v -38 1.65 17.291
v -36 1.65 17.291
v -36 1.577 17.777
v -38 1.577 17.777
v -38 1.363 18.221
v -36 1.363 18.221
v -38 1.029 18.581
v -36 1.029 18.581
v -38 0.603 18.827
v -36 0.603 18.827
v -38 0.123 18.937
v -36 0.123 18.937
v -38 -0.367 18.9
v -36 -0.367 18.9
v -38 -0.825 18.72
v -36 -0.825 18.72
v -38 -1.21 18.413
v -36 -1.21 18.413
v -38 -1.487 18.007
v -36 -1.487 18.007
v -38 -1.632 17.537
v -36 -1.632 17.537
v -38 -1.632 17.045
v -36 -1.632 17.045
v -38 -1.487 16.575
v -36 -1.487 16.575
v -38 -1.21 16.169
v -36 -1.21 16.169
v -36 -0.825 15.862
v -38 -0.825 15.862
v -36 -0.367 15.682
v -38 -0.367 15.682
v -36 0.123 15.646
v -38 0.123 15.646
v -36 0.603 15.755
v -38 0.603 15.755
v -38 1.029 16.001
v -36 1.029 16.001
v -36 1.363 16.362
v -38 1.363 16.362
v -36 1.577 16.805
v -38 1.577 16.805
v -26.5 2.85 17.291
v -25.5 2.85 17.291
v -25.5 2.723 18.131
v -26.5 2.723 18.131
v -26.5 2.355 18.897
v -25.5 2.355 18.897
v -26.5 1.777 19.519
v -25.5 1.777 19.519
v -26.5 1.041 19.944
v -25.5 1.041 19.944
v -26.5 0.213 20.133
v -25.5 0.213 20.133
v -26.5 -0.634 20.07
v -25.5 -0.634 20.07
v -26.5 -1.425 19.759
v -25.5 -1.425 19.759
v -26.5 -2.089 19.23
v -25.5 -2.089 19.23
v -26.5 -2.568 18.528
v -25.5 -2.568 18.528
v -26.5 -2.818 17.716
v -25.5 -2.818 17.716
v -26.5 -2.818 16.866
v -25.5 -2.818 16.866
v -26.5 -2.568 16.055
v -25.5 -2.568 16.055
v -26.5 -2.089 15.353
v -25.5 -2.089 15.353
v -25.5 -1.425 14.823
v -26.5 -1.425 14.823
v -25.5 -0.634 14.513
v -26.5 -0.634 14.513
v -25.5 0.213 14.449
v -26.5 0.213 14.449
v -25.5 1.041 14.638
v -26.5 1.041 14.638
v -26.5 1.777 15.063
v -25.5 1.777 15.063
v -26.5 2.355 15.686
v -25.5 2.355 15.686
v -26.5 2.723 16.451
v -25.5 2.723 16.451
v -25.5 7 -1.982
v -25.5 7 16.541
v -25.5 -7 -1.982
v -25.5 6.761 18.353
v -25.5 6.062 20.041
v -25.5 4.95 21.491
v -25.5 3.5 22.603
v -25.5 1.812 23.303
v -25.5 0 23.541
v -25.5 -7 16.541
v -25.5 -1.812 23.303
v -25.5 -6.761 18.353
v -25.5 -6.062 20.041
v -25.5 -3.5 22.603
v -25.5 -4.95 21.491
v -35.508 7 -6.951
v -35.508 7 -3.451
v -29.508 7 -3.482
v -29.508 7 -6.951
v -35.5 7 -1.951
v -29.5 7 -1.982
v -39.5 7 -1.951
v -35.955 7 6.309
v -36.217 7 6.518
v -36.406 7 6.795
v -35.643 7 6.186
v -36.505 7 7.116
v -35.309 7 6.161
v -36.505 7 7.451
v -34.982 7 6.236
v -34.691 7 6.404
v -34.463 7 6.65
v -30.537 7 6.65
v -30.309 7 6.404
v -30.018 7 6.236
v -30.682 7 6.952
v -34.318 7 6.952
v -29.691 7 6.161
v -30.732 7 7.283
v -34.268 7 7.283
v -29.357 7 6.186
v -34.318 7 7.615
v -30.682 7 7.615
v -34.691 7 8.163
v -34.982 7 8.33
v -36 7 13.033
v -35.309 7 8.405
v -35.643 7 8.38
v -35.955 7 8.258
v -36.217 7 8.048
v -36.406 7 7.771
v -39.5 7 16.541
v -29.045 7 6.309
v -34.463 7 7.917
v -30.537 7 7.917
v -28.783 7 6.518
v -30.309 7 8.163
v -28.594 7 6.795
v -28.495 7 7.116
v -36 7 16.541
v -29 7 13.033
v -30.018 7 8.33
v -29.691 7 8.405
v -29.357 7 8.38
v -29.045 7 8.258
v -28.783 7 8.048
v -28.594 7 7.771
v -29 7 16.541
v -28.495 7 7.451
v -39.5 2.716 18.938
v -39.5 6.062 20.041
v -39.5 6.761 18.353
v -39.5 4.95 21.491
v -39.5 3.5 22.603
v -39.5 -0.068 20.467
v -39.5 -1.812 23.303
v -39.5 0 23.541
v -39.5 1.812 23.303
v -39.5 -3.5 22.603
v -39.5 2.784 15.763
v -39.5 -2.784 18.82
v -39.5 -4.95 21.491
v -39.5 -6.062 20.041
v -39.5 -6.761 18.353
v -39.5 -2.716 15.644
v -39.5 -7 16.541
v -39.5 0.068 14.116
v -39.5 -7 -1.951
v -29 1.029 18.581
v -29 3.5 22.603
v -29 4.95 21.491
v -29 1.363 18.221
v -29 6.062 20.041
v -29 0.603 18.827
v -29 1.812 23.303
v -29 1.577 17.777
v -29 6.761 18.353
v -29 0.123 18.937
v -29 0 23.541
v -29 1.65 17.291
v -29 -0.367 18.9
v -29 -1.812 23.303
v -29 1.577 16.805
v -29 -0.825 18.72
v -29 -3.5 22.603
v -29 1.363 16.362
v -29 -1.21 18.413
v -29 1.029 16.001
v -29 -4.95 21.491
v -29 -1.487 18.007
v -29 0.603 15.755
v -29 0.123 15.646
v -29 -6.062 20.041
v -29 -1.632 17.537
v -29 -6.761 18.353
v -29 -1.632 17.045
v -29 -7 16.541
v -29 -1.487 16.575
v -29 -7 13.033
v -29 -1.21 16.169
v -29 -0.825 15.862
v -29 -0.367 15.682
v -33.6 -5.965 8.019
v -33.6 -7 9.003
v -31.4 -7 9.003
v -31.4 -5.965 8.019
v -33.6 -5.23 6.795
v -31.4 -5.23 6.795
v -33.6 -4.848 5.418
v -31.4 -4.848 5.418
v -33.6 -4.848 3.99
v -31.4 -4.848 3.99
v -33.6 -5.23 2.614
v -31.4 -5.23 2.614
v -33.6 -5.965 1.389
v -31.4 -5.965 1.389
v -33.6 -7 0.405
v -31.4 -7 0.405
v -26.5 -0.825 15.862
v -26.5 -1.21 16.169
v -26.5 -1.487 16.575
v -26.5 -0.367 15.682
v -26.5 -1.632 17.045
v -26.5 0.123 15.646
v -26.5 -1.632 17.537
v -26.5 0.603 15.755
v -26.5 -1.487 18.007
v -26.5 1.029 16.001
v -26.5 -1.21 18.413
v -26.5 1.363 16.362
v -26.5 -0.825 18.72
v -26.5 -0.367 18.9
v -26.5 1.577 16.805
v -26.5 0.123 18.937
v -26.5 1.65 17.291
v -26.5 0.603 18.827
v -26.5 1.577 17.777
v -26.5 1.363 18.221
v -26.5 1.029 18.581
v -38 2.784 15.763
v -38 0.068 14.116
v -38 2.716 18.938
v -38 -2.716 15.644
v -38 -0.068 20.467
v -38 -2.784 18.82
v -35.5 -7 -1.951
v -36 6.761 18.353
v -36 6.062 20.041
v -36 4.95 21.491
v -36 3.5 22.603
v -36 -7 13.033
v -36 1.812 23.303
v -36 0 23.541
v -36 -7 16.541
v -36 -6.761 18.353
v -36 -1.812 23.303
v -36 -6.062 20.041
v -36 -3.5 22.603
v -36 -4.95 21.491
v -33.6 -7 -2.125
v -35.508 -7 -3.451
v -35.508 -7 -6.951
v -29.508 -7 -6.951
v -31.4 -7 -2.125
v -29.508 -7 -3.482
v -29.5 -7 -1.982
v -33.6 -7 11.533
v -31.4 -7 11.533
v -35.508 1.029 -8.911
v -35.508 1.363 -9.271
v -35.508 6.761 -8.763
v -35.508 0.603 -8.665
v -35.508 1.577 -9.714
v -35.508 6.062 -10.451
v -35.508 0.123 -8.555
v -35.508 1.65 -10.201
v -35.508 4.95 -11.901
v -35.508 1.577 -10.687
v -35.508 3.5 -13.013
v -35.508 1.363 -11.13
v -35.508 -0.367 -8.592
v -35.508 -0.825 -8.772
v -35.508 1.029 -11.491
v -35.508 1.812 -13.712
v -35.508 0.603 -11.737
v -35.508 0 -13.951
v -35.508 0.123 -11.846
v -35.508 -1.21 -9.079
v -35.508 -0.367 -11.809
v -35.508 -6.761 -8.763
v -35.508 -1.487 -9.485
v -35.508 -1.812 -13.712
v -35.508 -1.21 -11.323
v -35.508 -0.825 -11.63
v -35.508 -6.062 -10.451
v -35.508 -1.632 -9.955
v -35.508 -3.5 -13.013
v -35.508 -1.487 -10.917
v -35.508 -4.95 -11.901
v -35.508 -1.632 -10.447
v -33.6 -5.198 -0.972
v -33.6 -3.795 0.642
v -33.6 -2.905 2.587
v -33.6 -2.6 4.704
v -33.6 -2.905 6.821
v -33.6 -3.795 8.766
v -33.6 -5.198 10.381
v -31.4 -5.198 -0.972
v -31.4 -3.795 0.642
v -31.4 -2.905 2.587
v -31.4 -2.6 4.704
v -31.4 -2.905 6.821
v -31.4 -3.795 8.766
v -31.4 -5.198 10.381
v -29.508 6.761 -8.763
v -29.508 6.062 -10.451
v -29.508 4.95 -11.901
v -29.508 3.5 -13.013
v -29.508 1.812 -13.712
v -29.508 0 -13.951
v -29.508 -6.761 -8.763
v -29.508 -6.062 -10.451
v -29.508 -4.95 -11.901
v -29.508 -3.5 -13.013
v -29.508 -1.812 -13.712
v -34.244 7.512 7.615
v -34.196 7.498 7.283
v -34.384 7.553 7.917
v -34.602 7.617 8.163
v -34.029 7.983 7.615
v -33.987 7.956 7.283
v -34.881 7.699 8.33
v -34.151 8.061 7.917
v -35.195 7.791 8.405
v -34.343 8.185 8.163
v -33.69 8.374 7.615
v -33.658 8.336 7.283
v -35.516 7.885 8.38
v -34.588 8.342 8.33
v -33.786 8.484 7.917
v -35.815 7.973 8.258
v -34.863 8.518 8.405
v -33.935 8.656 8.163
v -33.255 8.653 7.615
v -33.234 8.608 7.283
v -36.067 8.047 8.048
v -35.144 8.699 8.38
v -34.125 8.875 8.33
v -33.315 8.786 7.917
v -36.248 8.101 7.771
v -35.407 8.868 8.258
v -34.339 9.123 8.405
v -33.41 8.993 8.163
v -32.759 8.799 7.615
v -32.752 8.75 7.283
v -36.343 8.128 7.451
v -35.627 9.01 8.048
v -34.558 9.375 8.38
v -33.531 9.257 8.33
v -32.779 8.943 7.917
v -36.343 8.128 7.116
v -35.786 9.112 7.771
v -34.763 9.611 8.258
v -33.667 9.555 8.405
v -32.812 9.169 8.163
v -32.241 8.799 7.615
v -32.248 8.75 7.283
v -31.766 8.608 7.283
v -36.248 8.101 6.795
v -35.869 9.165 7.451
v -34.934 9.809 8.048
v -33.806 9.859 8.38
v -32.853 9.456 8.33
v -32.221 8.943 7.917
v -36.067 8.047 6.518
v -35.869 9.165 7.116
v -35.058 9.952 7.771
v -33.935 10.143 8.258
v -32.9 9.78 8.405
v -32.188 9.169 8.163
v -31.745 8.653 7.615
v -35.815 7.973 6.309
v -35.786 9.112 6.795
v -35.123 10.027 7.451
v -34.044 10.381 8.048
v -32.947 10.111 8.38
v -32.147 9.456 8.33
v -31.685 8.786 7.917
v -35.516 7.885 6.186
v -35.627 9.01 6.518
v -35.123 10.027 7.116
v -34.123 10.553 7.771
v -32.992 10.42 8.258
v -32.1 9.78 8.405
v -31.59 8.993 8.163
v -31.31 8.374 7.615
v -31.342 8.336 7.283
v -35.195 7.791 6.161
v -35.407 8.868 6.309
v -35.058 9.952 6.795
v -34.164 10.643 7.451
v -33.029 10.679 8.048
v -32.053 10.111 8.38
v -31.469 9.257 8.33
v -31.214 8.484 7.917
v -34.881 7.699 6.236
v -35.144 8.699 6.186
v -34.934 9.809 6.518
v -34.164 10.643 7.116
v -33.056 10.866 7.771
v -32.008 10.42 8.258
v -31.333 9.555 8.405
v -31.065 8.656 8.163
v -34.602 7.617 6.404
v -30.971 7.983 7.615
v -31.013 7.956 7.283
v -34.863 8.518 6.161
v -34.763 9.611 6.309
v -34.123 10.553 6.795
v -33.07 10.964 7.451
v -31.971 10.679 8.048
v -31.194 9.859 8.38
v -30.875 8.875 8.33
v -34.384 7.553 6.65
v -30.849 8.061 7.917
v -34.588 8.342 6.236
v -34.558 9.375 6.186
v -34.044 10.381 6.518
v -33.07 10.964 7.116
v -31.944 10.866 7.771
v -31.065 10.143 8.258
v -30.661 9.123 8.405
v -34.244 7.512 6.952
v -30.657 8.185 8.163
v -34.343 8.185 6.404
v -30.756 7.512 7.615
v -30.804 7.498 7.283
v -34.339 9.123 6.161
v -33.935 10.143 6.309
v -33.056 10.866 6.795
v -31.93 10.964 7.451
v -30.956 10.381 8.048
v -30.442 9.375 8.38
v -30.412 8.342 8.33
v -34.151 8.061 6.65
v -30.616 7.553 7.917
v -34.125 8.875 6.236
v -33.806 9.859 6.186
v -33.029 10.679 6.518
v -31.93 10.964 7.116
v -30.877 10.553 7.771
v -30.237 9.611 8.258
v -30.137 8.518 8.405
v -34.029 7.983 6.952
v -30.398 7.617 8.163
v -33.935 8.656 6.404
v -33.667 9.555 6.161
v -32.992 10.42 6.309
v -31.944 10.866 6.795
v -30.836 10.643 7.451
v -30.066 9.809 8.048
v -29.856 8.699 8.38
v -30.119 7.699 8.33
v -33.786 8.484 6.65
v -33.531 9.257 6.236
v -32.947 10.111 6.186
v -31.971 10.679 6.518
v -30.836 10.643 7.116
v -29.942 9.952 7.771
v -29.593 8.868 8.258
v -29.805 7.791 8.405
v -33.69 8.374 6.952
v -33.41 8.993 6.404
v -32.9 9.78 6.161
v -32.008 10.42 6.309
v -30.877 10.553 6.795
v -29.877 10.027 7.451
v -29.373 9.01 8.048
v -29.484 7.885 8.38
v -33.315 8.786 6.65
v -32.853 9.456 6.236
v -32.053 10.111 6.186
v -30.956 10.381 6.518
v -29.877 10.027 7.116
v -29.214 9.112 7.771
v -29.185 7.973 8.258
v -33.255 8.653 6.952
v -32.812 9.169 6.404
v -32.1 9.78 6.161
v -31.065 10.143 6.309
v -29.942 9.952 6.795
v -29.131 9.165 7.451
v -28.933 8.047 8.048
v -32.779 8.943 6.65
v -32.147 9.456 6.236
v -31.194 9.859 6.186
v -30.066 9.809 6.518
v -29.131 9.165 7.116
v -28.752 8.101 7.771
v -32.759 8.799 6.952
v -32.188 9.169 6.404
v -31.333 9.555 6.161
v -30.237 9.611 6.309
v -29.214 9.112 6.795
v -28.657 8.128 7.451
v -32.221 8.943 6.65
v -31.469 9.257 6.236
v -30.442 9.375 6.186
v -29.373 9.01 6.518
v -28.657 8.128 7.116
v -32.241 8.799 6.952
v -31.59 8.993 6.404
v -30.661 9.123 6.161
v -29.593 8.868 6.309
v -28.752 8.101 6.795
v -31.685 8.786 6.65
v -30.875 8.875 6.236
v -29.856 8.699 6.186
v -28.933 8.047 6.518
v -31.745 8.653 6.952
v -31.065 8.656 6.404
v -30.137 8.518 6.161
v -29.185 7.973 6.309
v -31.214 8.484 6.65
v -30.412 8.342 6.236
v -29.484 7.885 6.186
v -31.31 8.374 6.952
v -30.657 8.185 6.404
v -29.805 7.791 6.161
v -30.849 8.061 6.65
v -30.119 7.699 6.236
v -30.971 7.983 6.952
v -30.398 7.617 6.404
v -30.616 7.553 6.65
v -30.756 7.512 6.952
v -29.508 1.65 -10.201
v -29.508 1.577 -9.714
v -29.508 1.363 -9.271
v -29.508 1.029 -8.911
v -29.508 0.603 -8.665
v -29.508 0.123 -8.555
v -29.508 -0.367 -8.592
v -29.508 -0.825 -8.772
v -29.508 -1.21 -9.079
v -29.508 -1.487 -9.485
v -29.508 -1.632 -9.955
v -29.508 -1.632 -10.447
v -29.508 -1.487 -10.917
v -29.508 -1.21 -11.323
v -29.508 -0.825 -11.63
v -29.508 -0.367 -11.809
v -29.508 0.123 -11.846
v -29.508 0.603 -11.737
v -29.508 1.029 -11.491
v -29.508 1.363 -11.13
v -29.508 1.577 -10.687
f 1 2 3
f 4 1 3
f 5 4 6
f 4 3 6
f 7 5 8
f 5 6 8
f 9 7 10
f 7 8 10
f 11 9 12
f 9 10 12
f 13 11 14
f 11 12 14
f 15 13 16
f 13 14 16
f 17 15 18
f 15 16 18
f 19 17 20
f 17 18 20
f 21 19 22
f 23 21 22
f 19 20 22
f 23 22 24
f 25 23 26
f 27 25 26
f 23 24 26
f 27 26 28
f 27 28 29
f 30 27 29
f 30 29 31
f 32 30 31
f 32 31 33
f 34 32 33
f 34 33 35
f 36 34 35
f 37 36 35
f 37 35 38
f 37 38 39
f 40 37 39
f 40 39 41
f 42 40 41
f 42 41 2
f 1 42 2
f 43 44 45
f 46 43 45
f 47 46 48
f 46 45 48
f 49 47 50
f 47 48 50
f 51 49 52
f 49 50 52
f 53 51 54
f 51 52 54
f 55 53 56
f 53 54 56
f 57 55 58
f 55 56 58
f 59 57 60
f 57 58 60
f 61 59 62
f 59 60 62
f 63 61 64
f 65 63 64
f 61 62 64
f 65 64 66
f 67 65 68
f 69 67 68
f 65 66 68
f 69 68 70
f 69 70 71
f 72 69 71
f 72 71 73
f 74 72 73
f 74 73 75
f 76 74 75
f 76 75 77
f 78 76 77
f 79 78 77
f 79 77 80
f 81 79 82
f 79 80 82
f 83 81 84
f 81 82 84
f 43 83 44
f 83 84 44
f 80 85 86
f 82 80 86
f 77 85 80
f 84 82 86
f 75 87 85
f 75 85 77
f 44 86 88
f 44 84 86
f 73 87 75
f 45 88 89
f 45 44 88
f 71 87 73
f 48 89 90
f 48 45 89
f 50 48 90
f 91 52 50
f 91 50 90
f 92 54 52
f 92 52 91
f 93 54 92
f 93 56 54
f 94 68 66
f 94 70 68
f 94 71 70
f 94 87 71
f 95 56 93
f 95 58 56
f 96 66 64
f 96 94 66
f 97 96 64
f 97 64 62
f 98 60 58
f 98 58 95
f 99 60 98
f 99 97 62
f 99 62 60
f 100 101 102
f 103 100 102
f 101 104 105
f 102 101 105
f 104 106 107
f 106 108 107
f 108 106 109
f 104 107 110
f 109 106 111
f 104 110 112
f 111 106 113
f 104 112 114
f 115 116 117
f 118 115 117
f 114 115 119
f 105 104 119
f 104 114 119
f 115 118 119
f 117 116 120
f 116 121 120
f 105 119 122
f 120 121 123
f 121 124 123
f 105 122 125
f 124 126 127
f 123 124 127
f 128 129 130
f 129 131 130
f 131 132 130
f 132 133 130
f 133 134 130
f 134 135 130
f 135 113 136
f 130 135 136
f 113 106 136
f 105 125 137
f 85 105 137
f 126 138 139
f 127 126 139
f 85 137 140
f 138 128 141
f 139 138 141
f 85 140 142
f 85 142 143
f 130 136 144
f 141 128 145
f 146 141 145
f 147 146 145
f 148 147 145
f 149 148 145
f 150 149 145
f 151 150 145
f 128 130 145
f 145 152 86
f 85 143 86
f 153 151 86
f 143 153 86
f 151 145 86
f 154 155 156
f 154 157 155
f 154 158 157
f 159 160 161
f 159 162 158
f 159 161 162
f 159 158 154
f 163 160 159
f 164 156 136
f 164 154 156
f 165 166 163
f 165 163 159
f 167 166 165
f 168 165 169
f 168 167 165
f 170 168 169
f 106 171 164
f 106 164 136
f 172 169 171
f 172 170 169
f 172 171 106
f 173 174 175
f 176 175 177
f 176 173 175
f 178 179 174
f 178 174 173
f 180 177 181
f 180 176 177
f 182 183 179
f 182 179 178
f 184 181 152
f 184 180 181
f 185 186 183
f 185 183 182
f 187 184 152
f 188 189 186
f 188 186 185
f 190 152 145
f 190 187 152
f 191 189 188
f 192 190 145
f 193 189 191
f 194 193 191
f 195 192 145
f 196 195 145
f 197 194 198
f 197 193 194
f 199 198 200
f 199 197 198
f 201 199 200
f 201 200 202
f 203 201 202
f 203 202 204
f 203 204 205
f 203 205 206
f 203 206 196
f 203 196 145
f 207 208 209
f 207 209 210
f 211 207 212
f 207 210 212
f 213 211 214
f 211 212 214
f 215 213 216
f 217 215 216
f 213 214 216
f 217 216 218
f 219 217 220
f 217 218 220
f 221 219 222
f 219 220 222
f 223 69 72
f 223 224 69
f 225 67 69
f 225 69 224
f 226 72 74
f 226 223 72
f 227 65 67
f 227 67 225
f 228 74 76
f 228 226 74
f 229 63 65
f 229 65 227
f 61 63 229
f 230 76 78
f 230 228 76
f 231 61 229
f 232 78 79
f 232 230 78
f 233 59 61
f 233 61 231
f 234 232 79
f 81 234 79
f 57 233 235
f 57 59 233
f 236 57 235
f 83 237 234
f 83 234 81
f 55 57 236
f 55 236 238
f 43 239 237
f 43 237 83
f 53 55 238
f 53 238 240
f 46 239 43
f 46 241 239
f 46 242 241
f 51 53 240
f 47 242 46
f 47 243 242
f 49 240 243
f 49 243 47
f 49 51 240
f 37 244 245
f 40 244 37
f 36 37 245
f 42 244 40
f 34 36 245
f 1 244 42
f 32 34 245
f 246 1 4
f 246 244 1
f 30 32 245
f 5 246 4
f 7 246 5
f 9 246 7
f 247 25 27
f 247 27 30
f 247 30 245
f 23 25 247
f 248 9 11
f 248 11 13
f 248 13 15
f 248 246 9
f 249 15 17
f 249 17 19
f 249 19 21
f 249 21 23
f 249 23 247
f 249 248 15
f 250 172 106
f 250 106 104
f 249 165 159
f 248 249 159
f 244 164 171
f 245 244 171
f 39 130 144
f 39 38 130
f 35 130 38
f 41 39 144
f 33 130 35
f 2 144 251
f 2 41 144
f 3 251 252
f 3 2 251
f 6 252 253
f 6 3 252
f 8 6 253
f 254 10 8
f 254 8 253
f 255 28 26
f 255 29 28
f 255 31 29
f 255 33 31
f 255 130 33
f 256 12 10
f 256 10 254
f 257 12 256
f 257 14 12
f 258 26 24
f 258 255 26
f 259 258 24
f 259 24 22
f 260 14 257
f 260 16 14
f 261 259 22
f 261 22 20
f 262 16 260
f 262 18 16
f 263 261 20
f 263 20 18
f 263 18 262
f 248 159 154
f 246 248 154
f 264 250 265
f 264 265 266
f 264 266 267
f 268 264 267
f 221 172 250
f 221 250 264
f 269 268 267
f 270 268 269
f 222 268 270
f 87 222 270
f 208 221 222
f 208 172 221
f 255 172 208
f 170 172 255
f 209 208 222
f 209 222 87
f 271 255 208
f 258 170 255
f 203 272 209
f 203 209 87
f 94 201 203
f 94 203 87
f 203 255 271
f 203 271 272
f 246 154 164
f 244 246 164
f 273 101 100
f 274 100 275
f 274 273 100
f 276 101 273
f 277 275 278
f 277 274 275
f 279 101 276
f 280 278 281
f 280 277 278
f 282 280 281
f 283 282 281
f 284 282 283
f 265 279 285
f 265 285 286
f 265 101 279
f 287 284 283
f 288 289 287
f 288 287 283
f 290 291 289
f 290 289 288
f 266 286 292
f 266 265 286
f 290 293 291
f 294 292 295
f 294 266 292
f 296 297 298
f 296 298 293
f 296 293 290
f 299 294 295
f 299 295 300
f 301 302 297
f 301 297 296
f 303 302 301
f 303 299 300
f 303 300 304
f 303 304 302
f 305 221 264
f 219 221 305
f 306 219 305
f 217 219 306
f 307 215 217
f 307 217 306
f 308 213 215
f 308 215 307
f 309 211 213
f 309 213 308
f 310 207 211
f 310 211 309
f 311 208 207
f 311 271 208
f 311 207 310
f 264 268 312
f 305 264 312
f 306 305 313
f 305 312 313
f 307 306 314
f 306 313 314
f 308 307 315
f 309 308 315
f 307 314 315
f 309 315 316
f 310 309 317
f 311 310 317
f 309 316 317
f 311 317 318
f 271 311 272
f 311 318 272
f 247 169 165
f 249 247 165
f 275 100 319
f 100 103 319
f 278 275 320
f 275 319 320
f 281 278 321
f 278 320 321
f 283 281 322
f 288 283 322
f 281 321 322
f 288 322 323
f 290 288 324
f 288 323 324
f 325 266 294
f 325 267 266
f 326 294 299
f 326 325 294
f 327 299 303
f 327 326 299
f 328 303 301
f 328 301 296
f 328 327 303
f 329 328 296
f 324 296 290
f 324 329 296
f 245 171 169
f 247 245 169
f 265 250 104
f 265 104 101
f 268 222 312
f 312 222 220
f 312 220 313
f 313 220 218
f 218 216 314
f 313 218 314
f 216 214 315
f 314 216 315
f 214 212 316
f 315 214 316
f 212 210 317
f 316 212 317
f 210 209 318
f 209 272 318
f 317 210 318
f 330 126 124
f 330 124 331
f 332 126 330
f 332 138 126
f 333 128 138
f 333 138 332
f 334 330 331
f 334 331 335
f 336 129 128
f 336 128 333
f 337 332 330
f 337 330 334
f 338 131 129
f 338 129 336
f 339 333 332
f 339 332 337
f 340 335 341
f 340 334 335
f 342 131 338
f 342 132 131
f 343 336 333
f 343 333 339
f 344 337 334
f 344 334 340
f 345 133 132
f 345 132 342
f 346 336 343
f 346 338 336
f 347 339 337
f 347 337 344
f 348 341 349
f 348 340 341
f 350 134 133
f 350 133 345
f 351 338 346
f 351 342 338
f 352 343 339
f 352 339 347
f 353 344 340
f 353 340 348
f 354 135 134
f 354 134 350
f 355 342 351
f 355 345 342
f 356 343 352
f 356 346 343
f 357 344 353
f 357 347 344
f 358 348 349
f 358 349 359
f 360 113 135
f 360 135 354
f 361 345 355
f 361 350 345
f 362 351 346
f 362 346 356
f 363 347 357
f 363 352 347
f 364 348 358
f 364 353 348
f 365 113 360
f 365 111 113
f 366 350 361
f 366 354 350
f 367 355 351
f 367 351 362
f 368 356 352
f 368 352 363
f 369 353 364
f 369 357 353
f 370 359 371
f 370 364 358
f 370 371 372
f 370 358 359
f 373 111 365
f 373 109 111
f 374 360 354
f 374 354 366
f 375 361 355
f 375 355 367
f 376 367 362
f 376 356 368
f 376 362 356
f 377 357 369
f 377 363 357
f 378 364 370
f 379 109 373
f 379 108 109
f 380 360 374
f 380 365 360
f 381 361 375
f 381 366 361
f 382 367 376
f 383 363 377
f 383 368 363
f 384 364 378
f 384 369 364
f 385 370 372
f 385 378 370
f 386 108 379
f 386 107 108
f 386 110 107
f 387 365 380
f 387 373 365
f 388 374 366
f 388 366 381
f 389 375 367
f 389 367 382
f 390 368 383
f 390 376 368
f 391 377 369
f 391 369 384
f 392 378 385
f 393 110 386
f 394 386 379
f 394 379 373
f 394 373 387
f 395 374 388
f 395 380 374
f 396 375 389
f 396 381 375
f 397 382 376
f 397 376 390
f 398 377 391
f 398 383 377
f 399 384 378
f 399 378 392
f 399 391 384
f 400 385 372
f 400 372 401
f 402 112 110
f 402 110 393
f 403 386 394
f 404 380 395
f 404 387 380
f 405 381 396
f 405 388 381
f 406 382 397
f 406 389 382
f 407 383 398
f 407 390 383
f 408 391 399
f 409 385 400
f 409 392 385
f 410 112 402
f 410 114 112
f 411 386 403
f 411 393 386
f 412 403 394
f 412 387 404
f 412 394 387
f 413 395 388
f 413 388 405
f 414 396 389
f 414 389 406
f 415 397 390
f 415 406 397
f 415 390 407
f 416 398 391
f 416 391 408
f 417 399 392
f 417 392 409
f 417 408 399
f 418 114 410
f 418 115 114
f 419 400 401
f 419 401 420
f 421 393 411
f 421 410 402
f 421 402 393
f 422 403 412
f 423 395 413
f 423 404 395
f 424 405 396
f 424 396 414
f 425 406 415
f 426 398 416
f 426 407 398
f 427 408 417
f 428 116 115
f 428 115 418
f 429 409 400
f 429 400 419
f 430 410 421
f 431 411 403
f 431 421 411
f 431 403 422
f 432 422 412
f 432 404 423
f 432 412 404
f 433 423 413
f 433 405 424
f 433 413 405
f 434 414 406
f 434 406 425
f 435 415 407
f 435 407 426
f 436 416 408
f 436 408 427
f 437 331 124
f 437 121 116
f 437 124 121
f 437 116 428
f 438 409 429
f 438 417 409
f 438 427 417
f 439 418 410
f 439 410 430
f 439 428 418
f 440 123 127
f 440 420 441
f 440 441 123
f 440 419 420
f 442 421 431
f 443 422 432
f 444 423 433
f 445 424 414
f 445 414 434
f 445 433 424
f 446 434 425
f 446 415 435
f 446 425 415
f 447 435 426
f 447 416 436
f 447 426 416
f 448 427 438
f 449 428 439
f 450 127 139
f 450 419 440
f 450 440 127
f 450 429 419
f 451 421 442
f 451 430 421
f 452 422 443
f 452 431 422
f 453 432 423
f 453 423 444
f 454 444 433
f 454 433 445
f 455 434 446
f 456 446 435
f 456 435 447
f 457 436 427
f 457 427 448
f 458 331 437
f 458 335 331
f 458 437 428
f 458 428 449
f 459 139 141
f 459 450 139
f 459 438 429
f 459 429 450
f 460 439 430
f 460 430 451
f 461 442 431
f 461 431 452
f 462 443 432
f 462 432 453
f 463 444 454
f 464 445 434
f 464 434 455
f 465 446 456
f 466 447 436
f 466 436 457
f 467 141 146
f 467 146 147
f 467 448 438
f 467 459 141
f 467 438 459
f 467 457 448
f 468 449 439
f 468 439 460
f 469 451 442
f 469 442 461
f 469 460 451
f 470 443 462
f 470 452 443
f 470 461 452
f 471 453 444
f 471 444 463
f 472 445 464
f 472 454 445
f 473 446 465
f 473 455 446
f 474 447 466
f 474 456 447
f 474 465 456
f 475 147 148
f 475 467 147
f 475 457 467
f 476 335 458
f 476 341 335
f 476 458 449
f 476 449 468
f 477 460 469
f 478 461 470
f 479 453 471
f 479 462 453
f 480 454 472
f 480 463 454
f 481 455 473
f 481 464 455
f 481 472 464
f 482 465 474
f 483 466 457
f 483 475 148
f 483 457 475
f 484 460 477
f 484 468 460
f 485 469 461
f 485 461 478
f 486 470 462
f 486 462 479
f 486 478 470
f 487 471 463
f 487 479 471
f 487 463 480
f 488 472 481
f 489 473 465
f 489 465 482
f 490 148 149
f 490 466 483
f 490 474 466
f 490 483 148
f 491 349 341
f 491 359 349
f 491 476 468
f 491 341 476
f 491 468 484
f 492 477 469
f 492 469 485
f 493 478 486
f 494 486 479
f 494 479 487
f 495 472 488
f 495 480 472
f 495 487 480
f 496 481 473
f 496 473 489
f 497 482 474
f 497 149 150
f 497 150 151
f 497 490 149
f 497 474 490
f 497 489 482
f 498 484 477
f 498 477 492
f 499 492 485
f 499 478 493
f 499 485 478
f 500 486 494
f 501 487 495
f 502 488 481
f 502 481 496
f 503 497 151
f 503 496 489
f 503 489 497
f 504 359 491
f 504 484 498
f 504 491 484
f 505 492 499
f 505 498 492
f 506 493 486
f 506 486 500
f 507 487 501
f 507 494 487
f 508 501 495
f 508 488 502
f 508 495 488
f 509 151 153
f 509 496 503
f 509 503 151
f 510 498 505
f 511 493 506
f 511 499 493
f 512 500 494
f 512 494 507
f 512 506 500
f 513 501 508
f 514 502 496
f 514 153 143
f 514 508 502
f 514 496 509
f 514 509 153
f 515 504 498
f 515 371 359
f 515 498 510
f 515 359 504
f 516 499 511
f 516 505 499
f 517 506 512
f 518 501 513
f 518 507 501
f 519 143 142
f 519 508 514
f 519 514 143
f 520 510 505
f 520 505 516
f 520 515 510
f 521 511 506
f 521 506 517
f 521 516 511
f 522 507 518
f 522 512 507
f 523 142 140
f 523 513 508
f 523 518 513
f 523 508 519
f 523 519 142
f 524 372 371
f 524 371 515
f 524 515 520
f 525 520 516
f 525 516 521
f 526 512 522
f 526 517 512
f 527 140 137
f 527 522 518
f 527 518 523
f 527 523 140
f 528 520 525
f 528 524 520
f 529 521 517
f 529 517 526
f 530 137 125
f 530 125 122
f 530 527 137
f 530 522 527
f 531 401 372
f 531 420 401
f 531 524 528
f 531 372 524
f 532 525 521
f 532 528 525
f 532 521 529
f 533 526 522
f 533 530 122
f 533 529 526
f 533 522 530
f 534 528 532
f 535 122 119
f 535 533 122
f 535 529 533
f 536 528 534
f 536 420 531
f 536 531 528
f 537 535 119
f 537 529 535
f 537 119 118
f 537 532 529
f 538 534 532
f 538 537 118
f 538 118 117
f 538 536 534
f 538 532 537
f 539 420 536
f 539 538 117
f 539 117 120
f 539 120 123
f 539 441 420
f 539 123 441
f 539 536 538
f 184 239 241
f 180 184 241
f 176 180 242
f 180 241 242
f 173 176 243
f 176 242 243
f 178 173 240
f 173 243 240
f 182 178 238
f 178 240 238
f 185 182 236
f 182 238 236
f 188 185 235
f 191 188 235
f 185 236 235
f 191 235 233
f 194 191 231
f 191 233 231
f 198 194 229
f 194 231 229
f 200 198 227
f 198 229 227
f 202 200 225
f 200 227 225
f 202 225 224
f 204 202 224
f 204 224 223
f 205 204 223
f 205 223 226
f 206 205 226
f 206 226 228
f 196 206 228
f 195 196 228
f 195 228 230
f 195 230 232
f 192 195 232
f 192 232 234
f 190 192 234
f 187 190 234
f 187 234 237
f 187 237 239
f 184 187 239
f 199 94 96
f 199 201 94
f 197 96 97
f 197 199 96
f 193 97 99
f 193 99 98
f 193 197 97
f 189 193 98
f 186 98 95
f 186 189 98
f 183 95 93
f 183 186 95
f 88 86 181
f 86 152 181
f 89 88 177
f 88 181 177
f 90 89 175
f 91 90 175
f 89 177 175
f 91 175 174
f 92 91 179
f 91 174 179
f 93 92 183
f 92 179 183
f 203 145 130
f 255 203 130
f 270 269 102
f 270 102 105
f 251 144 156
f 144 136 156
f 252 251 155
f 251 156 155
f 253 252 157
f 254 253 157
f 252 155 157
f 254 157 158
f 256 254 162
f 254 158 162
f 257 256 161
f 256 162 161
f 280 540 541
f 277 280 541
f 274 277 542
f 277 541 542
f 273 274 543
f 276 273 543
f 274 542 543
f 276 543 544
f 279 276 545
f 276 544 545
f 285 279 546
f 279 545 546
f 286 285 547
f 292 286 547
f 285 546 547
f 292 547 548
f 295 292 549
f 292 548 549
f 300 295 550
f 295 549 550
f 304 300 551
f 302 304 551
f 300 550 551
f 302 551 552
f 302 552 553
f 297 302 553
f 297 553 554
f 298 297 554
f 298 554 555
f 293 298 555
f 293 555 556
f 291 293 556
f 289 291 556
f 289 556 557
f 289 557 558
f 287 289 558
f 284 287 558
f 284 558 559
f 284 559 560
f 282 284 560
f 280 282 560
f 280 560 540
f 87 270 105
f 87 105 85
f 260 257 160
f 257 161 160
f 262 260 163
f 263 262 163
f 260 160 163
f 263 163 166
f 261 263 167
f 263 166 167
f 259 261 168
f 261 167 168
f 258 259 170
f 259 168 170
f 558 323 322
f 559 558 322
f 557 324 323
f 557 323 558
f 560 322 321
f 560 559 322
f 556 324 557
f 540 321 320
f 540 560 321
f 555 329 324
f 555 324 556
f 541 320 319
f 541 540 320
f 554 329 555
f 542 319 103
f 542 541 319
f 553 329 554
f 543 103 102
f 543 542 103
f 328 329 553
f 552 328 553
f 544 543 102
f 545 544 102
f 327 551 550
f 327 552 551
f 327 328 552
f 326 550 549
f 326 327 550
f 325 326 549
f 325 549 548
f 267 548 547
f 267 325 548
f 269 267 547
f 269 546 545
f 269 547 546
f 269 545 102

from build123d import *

# Parameters (mm, degrees)
F1_DEPTH  = 7
F2_R      = 1.65
F3_DEPTH  = 25
F4_R      = 1.65
F5_DEPTH  = 25
F6_R      = 6.99999
F7_R      = 2.85
F8_DEPTH  = 1
F10_DEPTH = 1.5
F11_R     = 1.125
F13_R     = 1.125
F16_DEPTH = 25
F19_DEPTH = 1.1


# Not quite as in the source:
# - a fillet or chamfer is up to 0.001 mm smaller than in the source, because OpenCascade refuses the exact size
# - a feature names something its author has since deleted; it is built from what else it names


with BuildPart() as f1:
    # F0 (on Front) → F1 (new body, symmetric)
    with BuildSketch(Plane.XZ):
        Polygon((-39.5, 23.5411238112), (-39.5, 21.5411238112), (-39.5, -1.9508430529), (-35.5, -1.9508430529), (-35.5076822063, -3.4508233807), (-35.5076822063, -6.4508233807), (-29.5076822063, -6.4823476079), (-29.5076822063, -3.4823476079), (-29.5, -1.9823672801), (-25.5, -1.9823672801), (-25.5, 21.5411238112), (-25.5, 23.5411238112), (-29, 23.5411238112), (-29, 21.5334145057), (-29, 13.0334145057), (-36, 13.0334145057), (-36, 21.5411238112), (-36, 23.5411238112), align=None)
        Polygon((-29.5076822063, -6.4823476079), (-35.5076822063, -6.4508233807), (-35.5076822063, -13.9508233807), (-29.5076822063, -13.9508233807), align=None)
    extrude(amount=F1_DEPTH, both=True)

    # F2 (on face) → F3 (cut)
    with BuildSketch(Plane.YZ.offset(-29.5076822063)):
        with Locations((0, -10.2008233807)):
            Circle(F2_R)
    extrude(amount=-F3_DEPTH, mode=Mode.SUBTRACT)

    # F4 (on face) → F5 (cut)
    with BuildSketch(Plane.YZ.offset(-25.5)):
        with Locations((0, 17.2911238112)):
            Circle(F4_R)
    extrude(amount=-F5_DEPTH, mode=Mode.SUBTRACT)

    # F6 (radius 7 in the source; OpenCascade refuses exactly that, so slightly less here)
    f6_edges = [f1.edges().sort_by_distance(p)[0] for p in [
        (-37.75, -7, 23.541124),
        (-37.75, 7, 23.541124),
        (-27.25, 7, 23.541124),
        (-27.25, -7, 23.541124),
        (-32.507682, -7, -13.950823),
        (-32.507682, 7, -13.950823),
    ]]
    fillet(f6_edges, radius=F6_R)

    # F7 (on face) → F8 (cut)
    with BuildSketch(Plane.YZ.offset(-25.5)):
        with Locations((0, 17.2911238112)):
            Circle(F7_R)
    extrude(amount=-F8_DEPTH, mode=Mode.SUBTRACT)

    # F9 (on face) → F10 (cut)
    with BuildSketch(Plane(origin=(-39.5, 0, 0), x_dir=(0, -1, 0), z_dir=(-1, 0, 0))):
        Polygon((-0.0683087897, 14.1156973306), (2.7158456051, 15.6442534237), (2.7841543949, 18.8196799042), (0.0683087897, 20.4665502917), (-2.7158456051, 18.9379941986), (-2.7841543949, 15.7625677181), align=None)
    extrude(amount=-F10_DEPTH, mode=Mode.SUBTRACT)

    # F11 (on face) → F12 (revolve)
    with BuildSketch(Plane.XZ.offset(7)):
        with Locations((-35.5, 7.298982876)):
            Circle(F11_R)
    revolve(axis=Axis((-32.5, -7, 3.0412955625), (0, 0, -1)))

    # F13 (on face) → F14 (revolve)
    with BuildSketch(Plane(origin=(0, 7, 0), x_dir=(-1, 0, 0), z_dir=(0, 1, 0))):
        with Locations((29.6073952019, 7.2832577271)):
            Circle(F13_R)
    revolve(axis=Axis((-32.5, 7, 3.0412955625), (0, 0, -1)))

    # F15 (on face) → F16 (cut)
    with BuildSketch(Plane.XY.offset(13.0334145057)):
        Polygon((-25.5, -7), (-29, -7), (-36, -7), (-39.5, -7), (-39.5, -13.4261082858), (-25.5, -13.4261082858), align=None)
    extrude(amount=-F16_DEPTH, mode=Mode.SUBTRACT)

    # F18 (on offset) → F19 (cut, symmetric)
    with BuildSketch(Plane.YZ.offset(-32.5)):
        with BuildLine():
            ThreePointArc((-7, 9.0029031262), (-4.8, 4.7040660741), (-7, 0.4052290221))
            Line((-7, 0.4052290221), (-7, -2.1252823574))
            ThreePointArc((-7, -2.1252823574), (-2.6, 4.7040660741), (-7, 11.5334145057))
            Line((-7, 11.5334145057), (-7, 9.0029031262))
        make_face()
    extrude(amount=F19_DEPTH, both=True, mode=Mode.SUBTRACT)


solid = f1.part
